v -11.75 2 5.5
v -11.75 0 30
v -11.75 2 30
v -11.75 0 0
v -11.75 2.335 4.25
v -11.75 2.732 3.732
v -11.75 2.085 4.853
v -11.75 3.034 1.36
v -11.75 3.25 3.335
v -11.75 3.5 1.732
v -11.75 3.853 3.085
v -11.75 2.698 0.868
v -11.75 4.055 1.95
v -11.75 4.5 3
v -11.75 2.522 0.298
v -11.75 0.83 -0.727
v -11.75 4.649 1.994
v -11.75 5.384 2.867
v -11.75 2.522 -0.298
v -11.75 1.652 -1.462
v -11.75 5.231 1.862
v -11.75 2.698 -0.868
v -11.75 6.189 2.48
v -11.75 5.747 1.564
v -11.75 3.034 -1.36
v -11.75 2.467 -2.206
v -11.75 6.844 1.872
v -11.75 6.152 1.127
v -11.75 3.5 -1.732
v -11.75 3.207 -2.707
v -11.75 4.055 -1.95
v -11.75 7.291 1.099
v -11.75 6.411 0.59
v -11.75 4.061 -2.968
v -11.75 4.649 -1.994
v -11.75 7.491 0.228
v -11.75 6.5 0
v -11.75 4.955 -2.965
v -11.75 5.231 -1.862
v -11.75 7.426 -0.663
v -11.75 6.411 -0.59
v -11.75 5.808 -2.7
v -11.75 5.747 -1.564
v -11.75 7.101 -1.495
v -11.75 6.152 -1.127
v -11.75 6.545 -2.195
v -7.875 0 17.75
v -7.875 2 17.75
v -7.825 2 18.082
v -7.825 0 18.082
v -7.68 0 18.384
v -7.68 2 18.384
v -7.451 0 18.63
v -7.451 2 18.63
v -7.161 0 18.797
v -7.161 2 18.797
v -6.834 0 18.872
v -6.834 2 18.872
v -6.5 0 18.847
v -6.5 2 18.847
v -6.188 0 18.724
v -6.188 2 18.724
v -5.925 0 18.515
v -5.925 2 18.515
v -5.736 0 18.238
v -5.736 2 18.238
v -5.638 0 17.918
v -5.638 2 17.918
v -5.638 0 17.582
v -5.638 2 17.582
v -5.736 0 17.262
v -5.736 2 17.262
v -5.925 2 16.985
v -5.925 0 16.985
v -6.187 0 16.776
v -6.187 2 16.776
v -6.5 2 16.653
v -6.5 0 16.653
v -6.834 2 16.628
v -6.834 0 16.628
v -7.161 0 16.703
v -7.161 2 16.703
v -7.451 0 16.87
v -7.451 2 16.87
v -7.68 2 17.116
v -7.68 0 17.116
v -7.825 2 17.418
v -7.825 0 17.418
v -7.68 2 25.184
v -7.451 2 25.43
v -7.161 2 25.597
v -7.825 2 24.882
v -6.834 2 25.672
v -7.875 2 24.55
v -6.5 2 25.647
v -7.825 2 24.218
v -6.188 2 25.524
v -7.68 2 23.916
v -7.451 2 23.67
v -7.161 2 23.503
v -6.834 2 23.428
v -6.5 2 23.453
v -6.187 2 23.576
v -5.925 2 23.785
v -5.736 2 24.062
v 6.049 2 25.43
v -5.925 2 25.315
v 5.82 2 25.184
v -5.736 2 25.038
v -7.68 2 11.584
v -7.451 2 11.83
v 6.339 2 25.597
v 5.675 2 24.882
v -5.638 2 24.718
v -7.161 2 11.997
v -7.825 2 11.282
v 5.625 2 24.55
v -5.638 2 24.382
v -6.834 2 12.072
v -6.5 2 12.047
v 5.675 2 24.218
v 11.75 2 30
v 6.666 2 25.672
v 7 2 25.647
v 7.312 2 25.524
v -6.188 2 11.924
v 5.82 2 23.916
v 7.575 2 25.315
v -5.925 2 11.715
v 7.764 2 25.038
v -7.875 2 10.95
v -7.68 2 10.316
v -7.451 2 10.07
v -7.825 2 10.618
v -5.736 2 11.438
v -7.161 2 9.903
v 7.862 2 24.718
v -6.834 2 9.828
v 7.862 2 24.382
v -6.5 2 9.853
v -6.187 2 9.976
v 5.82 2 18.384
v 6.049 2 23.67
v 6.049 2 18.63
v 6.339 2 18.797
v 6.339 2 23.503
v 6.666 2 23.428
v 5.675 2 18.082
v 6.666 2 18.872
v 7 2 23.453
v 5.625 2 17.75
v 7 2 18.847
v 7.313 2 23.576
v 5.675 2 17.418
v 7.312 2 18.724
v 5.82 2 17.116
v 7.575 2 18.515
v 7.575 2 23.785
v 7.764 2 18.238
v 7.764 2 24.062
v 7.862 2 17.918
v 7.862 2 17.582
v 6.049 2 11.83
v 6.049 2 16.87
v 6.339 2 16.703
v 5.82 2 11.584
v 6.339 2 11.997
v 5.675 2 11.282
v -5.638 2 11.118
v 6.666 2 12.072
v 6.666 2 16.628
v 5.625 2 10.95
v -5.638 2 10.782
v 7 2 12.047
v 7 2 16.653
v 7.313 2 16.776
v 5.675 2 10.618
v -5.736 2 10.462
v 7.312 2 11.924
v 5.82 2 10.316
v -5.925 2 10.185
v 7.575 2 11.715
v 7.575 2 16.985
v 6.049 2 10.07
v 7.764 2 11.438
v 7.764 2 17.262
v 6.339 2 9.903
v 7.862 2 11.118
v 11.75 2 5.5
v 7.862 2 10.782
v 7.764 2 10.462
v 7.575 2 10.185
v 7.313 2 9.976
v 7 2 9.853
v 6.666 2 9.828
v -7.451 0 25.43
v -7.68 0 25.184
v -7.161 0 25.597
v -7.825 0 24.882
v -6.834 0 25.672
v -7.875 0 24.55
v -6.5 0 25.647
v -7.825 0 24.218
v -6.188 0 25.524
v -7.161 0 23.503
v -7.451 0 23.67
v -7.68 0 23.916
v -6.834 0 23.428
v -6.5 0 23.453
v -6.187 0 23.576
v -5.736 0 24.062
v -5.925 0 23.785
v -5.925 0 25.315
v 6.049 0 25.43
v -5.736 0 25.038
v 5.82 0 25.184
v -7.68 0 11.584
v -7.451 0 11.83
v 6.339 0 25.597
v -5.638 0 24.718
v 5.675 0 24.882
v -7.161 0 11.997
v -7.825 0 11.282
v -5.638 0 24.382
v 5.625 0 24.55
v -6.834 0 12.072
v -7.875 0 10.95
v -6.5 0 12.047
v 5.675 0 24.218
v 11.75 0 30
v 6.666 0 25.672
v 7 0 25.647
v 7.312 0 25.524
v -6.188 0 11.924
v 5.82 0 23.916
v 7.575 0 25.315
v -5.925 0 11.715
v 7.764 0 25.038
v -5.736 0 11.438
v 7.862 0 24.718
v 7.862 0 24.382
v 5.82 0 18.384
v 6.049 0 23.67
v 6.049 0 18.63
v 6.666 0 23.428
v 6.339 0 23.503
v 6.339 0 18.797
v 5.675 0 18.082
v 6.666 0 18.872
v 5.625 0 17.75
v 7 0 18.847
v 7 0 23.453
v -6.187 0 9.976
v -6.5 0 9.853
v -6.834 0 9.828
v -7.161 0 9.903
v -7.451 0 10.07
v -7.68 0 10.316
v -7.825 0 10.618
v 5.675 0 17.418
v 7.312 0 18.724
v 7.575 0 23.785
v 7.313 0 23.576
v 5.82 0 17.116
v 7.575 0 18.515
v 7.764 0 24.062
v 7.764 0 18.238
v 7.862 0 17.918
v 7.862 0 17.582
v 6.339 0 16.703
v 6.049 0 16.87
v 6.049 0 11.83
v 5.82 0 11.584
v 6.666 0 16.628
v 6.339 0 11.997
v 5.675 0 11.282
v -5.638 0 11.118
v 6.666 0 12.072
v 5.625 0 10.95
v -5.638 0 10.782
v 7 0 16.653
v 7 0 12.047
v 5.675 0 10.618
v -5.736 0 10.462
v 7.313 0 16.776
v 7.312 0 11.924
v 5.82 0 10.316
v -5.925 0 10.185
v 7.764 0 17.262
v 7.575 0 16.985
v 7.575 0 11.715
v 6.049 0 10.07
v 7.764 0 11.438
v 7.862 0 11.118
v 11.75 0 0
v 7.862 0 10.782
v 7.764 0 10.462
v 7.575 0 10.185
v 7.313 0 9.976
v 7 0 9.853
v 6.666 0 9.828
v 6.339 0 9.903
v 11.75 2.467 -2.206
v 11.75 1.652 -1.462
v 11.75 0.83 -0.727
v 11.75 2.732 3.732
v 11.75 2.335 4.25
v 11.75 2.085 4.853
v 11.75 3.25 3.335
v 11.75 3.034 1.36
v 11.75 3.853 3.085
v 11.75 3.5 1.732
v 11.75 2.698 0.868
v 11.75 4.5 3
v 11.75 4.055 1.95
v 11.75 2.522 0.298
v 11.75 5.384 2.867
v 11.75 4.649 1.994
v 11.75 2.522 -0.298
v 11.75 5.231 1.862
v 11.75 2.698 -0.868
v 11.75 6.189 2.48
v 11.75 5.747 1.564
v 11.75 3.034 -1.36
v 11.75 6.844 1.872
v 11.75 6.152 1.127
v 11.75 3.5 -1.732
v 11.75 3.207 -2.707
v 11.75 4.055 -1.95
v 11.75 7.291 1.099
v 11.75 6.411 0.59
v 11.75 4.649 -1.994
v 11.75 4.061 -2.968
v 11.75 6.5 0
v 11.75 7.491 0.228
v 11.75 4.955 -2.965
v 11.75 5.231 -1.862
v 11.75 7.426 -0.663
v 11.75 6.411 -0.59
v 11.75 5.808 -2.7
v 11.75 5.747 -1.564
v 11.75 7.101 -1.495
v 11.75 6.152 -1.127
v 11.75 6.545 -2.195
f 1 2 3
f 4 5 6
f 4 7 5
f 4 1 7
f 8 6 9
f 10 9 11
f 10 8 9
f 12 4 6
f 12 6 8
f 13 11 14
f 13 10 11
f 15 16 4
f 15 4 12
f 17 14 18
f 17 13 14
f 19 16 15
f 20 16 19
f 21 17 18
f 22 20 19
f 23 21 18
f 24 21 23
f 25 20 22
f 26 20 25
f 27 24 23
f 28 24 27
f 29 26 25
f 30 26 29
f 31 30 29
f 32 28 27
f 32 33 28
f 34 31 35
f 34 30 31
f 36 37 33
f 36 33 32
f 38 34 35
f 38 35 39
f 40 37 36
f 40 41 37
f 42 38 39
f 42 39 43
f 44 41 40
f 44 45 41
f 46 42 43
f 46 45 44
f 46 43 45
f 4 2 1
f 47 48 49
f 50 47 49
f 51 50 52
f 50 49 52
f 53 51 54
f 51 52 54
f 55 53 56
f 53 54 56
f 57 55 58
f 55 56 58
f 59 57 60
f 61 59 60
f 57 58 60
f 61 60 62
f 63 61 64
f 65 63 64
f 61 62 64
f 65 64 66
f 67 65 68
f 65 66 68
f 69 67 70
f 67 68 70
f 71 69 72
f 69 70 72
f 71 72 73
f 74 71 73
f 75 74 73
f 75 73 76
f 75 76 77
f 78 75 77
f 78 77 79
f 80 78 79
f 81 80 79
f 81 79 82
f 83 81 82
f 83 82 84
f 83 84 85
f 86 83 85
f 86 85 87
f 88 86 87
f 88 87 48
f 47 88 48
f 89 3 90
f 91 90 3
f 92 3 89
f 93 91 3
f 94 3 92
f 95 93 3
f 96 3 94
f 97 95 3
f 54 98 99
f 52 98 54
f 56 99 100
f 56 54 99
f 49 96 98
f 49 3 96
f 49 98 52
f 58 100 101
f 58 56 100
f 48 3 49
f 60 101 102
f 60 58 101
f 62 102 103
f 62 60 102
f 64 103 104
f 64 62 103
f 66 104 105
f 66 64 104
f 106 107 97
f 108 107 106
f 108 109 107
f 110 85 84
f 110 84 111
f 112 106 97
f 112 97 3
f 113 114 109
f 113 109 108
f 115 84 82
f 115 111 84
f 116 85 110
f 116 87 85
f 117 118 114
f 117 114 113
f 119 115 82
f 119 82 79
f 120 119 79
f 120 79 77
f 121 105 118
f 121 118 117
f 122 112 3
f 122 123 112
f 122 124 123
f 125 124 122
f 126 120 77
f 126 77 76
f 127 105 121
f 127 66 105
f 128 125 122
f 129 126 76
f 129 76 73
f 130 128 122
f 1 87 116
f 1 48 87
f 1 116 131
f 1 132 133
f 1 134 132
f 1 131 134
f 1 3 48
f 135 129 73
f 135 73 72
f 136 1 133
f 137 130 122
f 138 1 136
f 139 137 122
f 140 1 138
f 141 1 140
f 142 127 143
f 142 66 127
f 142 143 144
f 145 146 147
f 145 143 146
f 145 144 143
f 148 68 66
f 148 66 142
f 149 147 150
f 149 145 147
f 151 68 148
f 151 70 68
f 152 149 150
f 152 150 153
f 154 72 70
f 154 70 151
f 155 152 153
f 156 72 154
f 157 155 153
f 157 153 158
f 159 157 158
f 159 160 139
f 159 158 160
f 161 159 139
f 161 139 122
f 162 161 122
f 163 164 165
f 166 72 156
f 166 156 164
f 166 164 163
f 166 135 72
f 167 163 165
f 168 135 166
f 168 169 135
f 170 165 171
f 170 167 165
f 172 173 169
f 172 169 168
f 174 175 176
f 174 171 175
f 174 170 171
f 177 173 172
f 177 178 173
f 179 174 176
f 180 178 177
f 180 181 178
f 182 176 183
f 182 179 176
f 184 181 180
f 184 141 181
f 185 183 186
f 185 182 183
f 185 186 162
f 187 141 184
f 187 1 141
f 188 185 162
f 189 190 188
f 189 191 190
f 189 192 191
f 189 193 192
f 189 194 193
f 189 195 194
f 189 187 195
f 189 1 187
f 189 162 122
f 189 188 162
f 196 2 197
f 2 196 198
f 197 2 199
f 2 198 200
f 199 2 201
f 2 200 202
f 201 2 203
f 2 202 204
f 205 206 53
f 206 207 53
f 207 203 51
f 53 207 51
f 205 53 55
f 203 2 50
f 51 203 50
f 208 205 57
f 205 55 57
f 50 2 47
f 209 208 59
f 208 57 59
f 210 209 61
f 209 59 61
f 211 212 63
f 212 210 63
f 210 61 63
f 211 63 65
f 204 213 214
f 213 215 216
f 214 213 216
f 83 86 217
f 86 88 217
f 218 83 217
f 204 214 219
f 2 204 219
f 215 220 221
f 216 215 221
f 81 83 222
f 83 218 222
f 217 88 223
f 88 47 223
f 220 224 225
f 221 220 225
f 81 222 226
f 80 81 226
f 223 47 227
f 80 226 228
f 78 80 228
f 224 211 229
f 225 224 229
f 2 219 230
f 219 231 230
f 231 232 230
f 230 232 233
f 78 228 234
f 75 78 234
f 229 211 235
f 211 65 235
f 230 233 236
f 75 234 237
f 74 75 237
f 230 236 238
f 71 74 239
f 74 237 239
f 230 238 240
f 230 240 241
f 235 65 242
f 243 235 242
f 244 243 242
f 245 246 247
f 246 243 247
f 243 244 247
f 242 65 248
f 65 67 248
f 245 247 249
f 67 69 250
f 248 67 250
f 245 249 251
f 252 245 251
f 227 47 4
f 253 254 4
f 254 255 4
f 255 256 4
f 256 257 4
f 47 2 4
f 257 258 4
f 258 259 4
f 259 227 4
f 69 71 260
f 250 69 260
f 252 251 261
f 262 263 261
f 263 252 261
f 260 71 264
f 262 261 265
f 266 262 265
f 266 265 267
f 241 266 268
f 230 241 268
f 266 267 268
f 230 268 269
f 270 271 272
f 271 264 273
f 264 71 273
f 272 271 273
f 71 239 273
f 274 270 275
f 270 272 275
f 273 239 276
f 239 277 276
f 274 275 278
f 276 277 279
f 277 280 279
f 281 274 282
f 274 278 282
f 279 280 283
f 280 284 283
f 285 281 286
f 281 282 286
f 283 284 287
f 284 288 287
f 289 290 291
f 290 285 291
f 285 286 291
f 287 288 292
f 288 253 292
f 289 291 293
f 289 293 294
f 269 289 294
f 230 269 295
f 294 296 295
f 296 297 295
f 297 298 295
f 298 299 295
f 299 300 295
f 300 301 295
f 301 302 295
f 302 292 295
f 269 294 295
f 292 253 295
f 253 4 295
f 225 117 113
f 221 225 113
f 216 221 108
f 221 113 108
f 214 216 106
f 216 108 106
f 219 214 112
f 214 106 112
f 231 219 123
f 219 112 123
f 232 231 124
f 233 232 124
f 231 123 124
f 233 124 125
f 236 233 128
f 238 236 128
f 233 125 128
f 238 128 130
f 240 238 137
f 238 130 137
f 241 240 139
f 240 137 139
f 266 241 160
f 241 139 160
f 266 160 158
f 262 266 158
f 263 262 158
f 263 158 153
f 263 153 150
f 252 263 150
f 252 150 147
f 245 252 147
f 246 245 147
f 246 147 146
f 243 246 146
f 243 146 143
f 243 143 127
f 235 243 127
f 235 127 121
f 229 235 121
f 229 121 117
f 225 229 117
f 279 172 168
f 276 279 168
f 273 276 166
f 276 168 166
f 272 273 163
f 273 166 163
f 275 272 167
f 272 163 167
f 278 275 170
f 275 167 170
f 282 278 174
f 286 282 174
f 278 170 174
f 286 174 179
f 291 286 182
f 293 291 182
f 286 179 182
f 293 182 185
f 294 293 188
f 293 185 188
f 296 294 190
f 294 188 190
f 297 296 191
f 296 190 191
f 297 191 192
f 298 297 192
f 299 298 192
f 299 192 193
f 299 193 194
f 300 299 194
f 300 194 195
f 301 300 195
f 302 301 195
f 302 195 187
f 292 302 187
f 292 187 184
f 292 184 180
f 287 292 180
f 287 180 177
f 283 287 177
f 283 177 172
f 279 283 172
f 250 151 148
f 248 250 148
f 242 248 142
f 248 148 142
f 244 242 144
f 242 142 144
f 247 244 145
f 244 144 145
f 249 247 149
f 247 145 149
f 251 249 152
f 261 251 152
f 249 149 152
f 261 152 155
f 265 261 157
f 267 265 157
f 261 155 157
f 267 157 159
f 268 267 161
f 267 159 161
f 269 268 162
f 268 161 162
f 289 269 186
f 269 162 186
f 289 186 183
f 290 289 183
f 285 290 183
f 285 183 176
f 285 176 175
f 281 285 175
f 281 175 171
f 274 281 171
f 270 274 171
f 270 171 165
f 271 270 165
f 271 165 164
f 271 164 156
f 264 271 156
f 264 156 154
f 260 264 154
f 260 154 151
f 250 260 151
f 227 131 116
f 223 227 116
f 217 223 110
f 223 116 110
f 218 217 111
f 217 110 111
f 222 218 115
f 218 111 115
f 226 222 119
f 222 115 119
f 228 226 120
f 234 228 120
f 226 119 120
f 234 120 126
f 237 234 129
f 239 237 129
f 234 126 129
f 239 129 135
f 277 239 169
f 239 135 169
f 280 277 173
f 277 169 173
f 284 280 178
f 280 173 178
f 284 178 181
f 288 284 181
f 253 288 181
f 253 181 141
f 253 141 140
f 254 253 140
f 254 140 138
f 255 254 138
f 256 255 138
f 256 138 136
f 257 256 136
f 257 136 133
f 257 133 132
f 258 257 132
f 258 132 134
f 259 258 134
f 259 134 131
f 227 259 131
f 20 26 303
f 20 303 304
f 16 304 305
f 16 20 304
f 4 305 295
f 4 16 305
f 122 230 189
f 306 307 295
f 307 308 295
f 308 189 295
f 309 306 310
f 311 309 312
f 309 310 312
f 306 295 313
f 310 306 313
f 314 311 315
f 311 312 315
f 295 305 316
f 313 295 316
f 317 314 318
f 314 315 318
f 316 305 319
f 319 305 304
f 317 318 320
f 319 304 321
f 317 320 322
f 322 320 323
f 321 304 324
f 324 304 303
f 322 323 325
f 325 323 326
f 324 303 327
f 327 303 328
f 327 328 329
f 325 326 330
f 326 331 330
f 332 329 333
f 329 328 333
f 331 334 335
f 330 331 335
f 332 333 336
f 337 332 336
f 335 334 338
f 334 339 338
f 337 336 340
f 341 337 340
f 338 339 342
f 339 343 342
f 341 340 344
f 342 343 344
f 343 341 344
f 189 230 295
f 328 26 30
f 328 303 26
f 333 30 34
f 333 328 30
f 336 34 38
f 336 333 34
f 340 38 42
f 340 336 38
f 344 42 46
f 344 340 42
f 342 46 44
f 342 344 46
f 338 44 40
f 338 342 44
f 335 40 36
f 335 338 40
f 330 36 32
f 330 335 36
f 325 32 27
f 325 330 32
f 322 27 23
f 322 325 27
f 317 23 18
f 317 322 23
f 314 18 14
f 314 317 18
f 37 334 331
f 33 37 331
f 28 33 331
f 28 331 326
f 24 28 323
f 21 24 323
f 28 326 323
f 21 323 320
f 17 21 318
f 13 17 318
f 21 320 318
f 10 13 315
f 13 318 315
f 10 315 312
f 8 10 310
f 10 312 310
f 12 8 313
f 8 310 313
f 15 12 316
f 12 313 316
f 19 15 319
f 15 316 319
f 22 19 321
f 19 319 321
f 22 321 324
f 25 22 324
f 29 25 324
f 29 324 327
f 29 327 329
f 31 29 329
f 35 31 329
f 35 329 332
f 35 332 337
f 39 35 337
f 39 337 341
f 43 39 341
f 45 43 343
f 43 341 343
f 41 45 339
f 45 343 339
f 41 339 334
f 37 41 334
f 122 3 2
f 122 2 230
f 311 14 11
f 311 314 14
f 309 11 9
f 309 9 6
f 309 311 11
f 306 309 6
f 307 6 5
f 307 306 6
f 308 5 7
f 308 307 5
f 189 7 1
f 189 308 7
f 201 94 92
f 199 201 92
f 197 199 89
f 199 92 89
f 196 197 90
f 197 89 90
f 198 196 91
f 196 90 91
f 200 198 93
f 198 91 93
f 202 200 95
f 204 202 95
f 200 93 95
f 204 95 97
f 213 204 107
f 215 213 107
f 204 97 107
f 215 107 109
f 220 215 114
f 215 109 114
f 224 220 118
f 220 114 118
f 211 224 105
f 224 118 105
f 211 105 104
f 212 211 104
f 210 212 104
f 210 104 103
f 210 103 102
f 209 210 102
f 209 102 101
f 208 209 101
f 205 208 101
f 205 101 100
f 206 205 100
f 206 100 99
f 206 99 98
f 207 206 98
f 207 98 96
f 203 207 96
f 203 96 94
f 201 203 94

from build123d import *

# Parameters (mm, degrees)
SKETCH1_W           = 23.5
SKETCH1_H           = 2
BOSS_EXTRUDE1_DEPTH = 30
SKETCH2_R           = 3
SKETCH2_R_2         = 2
BOSS_EXTRUDE2_DEPTH = 23.5
FILLET1_R           = 110
FILLET2_R           = 2.5
SKETCH3_R           = 1.125
CUT_EXTRUDE1_DEPTH  = 24


with BuildPart() as part:
    # Sketch1 → Boss-Extrude1 (new body)
    with BuildSketch(Plane.XY):
        with Locations((0, 1)):
            Rectangle(SKETCH1_W, SKETCH1_H)
    extrude(amount=BOSS_EXTRUDE1_DEPTH)

    # Sketch2 → Boss-Extrude2 (add)
    with BuildSketch(Plane(origin=(11.75, 0, 0), x_dir=(0, 0, -1), z_dir=(1, 0, 0))):
        with Locations((0, 4.5)):
            Circle(SKETCH2_R)
        with Locations(Location((0, 4.5, 0), (0, 0, 90))):
            Circle(SKETCH2_R_2, mode=Mode.SUBTRACT)
    extrude(amount=-BOSS_EXTRUDE2_DEPTH)

    # Fillet1
    # the kernel refuses this fillet: 110 mm, written as the material it adds along each edge
    with BuildSketch(Plane(origin=(-11.75, 1.5, 0), x_dir=(0, -1, 0), z_dir=(1, 0, 0))) as fillet1_piece_1:
        with BuildLine():
            CenterArc((73.583333333, 83.090270523), FILLET1_R, 227.333597139, 1.723771549)
            ThreePointArc((-0.966814159, 2.205936386), (-0.252313926, 1.204251319), (0, 0))
            Line((0, 0), (1.5, 0))
        make_face()
    extrude(amount=23.5)

    # Fillet2
    fillet2_edges = [part.edges().sort_by_distance(p)[0] for p in [
        (0, 2, 1.658312395),
    ]]
    fillet(fillet2_edges, radius=FILLET2_R)

    # Sketch3 → Cut-Extrude1 (cut)
    with BuildSketch(Plane(origin=(0, 2, 0), x_dir=(1, 0, 0), z_dir=(0, 1, 0))):
        with Locations(Location((-6.75, -10.95, 0), (0, 0, 180))):
            Circle(SKETCH3_R)
        with Locations(Location((-6.75, -17.75, 0), (0, 0, 180))):
            Circle(SKETCH3_R)
        with Locations(Location((-6.75, -24.55, 0), (0, 0, 180))):
            Circle(SKETCH3_R)
        with Locations(Location((6.75, -24.55, 0), (0, 0, 180))):
            Circle(SKETCH3_R)
        with Locations(Location((6.75, -17.75, 0), (0, 0, 180))):
            Circle(SKETCH3_R)
        with Locations(Location((6.75, -10.95, 0), (0, 0, 180))):
            Circle(SKETCH3_R)
    extrude(amount=-CUT_EXTRUDE1_DEPTH, mode=Mode.SUBTRACT)


solid = part.part
